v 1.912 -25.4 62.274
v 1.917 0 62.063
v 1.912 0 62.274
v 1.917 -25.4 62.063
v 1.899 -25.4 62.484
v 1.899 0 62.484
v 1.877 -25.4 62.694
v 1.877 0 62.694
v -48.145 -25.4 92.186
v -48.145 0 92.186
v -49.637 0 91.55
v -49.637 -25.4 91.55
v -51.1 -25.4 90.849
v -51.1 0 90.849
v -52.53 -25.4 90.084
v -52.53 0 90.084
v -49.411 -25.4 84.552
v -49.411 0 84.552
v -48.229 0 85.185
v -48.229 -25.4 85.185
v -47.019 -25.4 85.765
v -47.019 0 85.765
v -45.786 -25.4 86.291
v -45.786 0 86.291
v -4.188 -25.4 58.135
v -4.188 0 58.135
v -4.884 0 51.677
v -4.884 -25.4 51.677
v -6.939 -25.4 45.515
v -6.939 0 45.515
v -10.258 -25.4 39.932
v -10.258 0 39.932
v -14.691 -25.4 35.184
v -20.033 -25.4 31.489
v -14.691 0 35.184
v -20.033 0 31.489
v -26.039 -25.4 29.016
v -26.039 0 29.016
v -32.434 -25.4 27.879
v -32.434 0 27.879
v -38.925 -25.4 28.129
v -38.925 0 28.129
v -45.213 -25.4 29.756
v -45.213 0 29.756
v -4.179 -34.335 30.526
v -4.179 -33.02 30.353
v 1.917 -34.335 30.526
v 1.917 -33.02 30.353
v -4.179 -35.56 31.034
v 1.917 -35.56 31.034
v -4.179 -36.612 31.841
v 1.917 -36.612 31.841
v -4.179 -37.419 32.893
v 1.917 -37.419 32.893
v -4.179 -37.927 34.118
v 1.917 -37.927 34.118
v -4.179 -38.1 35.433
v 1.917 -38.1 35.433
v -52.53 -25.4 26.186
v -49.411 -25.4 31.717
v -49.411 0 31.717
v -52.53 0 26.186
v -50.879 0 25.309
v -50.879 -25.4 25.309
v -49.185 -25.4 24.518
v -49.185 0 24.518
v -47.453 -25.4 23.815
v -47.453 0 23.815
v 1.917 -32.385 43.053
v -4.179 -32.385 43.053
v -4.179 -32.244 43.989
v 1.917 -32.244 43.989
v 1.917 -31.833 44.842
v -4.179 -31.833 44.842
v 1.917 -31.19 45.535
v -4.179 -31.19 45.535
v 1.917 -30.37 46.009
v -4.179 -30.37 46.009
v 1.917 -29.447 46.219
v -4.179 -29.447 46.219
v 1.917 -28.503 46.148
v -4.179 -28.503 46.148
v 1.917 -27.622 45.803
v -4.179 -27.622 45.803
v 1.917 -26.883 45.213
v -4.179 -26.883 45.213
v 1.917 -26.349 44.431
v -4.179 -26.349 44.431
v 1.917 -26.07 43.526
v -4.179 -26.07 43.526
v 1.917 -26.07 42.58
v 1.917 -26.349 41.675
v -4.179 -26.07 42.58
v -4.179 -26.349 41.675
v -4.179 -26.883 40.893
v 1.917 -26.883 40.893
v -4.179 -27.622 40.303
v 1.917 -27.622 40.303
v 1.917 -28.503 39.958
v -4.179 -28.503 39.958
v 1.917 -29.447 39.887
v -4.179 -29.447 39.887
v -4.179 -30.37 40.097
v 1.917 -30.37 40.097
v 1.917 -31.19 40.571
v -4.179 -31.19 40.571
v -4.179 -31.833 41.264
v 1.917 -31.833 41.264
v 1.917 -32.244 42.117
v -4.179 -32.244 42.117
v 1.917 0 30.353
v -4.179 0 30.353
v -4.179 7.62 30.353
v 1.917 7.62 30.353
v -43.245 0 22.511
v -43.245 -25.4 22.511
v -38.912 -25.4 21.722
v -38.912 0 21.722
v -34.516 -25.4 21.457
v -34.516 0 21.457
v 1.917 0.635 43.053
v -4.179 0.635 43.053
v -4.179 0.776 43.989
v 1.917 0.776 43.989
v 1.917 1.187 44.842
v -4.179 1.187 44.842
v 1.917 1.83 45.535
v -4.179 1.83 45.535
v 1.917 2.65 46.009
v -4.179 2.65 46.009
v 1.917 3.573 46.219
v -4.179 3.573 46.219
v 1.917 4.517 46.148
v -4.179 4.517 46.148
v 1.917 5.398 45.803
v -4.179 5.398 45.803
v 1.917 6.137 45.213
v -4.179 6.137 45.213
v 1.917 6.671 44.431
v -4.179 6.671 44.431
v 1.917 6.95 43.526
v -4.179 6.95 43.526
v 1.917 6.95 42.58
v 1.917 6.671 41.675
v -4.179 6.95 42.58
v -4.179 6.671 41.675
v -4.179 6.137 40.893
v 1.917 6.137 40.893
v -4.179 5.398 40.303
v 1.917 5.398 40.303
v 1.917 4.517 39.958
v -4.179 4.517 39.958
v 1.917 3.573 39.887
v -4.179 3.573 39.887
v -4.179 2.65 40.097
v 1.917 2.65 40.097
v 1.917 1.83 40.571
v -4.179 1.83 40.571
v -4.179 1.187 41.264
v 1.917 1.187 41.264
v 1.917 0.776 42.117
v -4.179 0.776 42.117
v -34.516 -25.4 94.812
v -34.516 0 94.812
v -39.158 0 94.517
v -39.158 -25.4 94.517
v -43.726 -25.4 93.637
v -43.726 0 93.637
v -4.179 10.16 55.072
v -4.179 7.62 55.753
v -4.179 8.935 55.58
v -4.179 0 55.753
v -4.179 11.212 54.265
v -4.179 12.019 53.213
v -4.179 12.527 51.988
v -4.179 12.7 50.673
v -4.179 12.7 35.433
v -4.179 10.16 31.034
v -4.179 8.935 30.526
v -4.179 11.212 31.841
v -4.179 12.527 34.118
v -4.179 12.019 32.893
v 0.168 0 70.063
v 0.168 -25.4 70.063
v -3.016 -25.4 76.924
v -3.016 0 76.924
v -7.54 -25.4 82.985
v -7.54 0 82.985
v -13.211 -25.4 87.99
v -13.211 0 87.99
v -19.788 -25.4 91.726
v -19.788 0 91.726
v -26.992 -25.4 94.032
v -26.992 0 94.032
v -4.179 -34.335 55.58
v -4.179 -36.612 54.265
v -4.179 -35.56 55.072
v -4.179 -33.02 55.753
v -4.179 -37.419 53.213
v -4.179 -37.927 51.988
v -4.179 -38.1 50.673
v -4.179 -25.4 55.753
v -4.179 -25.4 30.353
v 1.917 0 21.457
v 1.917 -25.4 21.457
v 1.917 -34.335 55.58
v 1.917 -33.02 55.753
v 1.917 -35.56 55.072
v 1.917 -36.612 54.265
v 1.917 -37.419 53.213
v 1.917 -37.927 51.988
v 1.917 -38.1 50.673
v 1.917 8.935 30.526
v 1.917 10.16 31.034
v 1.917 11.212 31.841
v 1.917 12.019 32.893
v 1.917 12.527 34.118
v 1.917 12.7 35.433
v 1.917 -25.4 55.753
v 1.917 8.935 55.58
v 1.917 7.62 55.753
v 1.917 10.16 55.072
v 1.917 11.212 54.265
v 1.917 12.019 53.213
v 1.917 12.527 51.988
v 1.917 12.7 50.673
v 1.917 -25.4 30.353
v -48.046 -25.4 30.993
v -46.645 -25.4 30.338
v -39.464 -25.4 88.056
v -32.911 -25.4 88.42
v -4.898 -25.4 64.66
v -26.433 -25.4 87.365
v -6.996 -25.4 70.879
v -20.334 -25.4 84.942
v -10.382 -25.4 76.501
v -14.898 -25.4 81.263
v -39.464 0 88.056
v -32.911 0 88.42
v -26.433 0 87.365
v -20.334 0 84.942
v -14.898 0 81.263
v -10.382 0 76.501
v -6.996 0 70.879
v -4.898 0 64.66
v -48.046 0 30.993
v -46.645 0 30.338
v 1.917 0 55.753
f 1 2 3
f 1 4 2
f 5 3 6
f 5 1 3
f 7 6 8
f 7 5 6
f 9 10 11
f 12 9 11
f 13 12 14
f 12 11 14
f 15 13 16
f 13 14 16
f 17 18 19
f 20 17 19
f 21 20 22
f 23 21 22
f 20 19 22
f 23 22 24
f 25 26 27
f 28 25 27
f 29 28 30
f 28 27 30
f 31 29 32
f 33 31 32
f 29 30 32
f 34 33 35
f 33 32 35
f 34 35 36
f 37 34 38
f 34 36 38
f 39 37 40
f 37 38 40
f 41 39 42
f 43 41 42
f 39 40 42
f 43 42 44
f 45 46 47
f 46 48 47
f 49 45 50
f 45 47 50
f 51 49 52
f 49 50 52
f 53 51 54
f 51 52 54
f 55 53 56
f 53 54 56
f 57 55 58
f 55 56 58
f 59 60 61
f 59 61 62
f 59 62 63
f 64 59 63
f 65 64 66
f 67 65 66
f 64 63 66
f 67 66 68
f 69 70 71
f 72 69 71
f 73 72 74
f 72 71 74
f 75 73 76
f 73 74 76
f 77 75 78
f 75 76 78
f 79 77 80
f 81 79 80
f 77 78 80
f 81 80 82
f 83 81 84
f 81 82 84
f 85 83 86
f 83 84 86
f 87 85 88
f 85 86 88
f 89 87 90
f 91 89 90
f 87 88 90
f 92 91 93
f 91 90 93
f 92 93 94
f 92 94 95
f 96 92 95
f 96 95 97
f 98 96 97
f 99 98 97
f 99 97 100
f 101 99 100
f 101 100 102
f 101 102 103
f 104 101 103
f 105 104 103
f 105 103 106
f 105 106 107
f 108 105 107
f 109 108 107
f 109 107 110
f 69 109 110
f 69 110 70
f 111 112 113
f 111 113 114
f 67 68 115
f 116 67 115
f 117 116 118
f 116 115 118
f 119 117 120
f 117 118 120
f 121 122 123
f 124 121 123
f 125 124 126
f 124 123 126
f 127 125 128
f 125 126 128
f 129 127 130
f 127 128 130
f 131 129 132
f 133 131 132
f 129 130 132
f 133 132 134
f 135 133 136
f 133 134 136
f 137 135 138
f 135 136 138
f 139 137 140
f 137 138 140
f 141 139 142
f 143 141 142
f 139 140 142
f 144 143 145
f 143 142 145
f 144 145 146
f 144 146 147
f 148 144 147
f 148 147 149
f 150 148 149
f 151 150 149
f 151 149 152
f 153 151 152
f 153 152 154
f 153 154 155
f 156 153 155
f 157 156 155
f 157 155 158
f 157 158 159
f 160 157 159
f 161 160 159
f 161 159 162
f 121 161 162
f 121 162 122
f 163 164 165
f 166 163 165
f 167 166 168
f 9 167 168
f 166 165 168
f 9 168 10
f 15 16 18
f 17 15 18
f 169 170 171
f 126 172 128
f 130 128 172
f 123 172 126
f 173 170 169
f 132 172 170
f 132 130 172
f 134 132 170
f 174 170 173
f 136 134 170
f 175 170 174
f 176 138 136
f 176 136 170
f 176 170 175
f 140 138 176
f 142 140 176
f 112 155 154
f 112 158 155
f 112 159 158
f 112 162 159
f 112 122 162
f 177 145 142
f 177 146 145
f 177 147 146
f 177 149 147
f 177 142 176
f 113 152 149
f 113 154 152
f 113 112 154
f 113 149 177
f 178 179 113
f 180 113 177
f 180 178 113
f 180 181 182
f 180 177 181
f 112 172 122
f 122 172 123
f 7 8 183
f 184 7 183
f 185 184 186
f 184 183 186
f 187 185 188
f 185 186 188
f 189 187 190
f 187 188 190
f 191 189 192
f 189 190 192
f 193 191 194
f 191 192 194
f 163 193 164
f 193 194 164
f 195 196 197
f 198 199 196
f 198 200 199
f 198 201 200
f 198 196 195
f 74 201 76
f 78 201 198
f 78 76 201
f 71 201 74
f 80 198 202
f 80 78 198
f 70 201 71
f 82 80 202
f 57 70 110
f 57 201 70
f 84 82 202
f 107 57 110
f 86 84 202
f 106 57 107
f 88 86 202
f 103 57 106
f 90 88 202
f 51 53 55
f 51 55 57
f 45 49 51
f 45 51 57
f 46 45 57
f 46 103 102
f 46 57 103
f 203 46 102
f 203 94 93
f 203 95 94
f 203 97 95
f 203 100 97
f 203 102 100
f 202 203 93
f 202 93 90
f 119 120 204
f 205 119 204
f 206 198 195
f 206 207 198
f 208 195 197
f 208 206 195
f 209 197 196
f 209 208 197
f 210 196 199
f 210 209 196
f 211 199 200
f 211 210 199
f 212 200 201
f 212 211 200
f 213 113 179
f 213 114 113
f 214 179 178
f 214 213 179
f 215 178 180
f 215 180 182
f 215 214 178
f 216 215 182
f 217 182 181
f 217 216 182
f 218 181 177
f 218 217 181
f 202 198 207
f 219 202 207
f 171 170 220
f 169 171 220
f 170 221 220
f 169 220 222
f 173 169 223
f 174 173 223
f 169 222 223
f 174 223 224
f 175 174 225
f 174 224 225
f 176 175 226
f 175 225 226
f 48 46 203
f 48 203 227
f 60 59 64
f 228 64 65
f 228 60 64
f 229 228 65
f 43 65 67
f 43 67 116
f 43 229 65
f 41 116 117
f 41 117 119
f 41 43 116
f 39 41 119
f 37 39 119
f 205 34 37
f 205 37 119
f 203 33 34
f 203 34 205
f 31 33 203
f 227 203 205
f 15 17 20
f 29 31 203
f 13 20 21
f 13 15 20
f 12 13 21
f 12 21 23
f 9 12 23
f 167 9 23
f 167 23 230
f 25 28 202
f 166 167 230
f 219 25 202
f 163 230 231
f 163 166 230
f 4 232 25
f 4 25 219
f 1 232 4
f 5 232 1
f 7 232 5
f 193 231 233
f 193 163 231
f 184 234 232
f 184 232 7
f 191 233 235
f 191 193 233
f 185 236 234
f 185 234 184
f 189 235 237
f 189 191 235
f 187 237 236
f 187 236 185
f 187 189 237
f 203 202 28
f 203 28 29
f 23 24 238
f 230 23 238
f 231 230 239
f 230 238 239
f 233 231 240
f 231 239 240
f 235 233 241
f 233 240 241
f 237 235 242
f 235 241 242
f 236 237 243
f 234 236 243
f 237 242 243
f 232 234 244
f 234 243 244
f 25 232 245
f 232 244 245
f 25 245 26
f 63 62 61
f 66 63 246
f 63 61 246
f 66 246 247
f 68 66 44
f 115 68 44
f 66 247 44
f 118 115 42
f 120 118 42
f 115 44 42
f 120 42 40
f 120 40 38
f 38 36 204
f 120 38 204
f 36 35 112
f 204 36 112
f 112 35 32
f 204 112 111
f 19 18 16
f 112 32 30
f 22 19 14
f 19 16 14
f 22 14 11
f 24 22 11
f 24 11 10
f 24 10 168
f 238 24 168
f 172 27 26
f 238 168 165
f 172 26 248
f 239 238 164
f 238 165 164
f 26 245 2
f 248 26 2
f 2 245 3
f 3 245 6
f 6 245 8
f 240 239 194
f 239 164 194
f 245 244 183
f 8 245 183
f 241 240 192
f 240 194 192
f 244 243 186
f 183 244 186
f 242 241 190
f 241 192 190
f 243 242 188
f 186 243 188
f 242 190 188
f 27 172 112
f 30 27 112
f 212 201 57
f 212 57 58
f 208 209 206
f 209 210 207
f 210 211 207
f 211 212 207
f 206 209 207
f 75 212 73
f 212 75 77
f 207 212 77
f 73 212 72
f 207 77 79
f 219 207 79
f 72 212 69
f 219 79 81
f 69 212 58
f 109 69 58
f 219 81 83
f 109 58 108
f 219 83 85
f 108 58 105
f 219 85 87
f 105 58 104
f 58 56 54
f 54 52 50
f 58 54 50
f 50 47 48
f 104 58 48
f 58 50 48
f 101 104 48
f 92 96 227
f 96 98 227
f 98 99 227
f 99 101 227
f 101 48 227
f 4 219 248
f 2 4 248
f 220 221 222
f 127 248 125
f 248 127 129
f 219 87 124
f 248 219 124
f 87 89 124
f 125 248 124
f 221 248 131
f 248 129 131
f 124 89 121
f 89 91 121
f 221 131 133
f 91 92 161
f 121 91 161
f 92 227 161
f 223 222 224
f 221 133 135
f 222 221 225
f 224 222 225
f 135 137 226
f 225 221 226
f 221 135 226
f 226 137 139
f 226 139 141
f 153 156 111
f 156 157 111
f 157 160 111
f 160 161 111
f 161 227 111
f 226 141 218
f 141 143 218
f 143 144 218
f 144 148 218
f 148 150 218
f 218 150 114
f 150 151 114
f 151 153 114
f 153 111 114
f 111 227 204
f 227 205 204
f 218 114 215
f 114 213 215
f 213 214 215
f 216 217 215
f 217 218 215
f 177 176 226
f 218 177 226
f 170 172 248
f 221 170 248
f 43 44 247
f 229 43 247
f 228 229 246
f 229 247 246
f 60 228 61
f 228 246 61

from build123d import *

# Parameters (mm, degrees)
F2_DEPTH = 25.4
F3_W     = 6.096
F3_H     = 50.8
F4_DEPTH = 25.4
F5_R     = 5.08
F6_R     = 3.175
F7_DEPTH = 6.097
F8_R     = 3.175
F9_DEPTH = 6.097


# Not quite as in the source:
# - a feature names something its author has since deleted; it is built from what else it names


with BuildPart() as f2:
    # F1 (on Front) → F2 (new body)
    with BuildSketch(Plane.XZ):
        with BuildLine():
            ThreePointArc((-4.1881381368, 58.1348573723), (-17.2625408115, 33.1930369346), (-45.2129217657, 29.7563791738))
            ThreePointArc((-45.2129217657, 29.7563791738), (-47.3496102258, 30.6565141034), (-49.4112893939, 31.7172494495))
            Line((-49.4112893939, 31.7172494495), (-52.5301234092, 26.1859408896))
            ThreePointArc((-52.5301234092, 26.1859408896), (-50.0367693734, 24.903108528), (-47.4527005825, 23.8145031357))
            ThreePointArc((-47.4527005825, 23.8145031357), (-41.0907281326, 22.0513224192), (-34.5157381367, 21.4571791316))
            Line((-34.5157381367, 21.4571791316), (1.9167693099, 21.4571791316))
            Line((1.9167693099, 21.4571791316), (1.9167693099, 62.3678327477))
            ThreePointArc((1.9167693099, 62.3678327477), (-10.1232383217, 85.5255128665), (-34.5157381367, 94.8123791316))
            ThreePointArc((-34.5157381367, 94.8123791316), (-41.4558425944, 94.1497939431), (-48.145199434, 92.1859777376))
            ThreePointArc((-48.145199434, 92.1859777376), (-50.3725422349, 91.2075489816), (-52.5301234092, 90.0836173735))
            Line((-52.5301234092, 90.0836173735), (-49.4112893939, 84.5523088136))
            ThreePointArc((-49.4112893939, 84.5523088136), (-47.6272506666, 85.4816539244), (-45.7855281567, 86.2906871202))
            ThreePointArc((-45.7855281567, 86.2906871202), (-17.5160993904, 83.2500255818), (-4.1881381368, 58.1348573723))
        make_face()
    extrude(amount=F2_DEPTH)

    # F3 (on offset) → F4 (join)
    with BuildSketch(Plane.XY.offset(30.353)):
        with Locations((-1.1312306901, -12.7)):
            Rectangle(F3_W, F3_H)
    extrude(amount=F4_DEPTH)

    # F5
    f5_edges = [f2.edges().sort_by_distance(p)[0] for p in [
        (1.916769, -12.7, 62.367833),
        (-1.131231, -38.1, 55.753),
        (-1.131231, -38.1, 30.353),
        (-1.131231, 12.7, 30.353),
        (-1.131231, 12.7, 55.753),
    ]]
    fillet(f5_edges, radius=F5_R)

    # F6 (on face) → F7 (cut, through all)
    with BuildSketch(Plane(origin=(-4.1792306901, 0, 0), x_dir=(0, -1, 0), z_dir=(-1, 0, 0))):
        with Locations((-3.81, 43.053)):
            Circle(F6_R)
    extrude(amount=-F7_DEPTH, mode=Mode.SUBTRACT)

    # F8 (on face) → F9 (cut, through all)
    with BuildSketch(Plane(origin=(-4.1792306901, 0, 0), x_dir=(0, -1, 0), z_dir=(-1, 0, 0))):
        with Locations((29.21, 43.053)):
            Circle(F8_R)
    extrude(amount=-F9_DEPTH, mode=Mode.SUBTRACT)


solid = f2.part
